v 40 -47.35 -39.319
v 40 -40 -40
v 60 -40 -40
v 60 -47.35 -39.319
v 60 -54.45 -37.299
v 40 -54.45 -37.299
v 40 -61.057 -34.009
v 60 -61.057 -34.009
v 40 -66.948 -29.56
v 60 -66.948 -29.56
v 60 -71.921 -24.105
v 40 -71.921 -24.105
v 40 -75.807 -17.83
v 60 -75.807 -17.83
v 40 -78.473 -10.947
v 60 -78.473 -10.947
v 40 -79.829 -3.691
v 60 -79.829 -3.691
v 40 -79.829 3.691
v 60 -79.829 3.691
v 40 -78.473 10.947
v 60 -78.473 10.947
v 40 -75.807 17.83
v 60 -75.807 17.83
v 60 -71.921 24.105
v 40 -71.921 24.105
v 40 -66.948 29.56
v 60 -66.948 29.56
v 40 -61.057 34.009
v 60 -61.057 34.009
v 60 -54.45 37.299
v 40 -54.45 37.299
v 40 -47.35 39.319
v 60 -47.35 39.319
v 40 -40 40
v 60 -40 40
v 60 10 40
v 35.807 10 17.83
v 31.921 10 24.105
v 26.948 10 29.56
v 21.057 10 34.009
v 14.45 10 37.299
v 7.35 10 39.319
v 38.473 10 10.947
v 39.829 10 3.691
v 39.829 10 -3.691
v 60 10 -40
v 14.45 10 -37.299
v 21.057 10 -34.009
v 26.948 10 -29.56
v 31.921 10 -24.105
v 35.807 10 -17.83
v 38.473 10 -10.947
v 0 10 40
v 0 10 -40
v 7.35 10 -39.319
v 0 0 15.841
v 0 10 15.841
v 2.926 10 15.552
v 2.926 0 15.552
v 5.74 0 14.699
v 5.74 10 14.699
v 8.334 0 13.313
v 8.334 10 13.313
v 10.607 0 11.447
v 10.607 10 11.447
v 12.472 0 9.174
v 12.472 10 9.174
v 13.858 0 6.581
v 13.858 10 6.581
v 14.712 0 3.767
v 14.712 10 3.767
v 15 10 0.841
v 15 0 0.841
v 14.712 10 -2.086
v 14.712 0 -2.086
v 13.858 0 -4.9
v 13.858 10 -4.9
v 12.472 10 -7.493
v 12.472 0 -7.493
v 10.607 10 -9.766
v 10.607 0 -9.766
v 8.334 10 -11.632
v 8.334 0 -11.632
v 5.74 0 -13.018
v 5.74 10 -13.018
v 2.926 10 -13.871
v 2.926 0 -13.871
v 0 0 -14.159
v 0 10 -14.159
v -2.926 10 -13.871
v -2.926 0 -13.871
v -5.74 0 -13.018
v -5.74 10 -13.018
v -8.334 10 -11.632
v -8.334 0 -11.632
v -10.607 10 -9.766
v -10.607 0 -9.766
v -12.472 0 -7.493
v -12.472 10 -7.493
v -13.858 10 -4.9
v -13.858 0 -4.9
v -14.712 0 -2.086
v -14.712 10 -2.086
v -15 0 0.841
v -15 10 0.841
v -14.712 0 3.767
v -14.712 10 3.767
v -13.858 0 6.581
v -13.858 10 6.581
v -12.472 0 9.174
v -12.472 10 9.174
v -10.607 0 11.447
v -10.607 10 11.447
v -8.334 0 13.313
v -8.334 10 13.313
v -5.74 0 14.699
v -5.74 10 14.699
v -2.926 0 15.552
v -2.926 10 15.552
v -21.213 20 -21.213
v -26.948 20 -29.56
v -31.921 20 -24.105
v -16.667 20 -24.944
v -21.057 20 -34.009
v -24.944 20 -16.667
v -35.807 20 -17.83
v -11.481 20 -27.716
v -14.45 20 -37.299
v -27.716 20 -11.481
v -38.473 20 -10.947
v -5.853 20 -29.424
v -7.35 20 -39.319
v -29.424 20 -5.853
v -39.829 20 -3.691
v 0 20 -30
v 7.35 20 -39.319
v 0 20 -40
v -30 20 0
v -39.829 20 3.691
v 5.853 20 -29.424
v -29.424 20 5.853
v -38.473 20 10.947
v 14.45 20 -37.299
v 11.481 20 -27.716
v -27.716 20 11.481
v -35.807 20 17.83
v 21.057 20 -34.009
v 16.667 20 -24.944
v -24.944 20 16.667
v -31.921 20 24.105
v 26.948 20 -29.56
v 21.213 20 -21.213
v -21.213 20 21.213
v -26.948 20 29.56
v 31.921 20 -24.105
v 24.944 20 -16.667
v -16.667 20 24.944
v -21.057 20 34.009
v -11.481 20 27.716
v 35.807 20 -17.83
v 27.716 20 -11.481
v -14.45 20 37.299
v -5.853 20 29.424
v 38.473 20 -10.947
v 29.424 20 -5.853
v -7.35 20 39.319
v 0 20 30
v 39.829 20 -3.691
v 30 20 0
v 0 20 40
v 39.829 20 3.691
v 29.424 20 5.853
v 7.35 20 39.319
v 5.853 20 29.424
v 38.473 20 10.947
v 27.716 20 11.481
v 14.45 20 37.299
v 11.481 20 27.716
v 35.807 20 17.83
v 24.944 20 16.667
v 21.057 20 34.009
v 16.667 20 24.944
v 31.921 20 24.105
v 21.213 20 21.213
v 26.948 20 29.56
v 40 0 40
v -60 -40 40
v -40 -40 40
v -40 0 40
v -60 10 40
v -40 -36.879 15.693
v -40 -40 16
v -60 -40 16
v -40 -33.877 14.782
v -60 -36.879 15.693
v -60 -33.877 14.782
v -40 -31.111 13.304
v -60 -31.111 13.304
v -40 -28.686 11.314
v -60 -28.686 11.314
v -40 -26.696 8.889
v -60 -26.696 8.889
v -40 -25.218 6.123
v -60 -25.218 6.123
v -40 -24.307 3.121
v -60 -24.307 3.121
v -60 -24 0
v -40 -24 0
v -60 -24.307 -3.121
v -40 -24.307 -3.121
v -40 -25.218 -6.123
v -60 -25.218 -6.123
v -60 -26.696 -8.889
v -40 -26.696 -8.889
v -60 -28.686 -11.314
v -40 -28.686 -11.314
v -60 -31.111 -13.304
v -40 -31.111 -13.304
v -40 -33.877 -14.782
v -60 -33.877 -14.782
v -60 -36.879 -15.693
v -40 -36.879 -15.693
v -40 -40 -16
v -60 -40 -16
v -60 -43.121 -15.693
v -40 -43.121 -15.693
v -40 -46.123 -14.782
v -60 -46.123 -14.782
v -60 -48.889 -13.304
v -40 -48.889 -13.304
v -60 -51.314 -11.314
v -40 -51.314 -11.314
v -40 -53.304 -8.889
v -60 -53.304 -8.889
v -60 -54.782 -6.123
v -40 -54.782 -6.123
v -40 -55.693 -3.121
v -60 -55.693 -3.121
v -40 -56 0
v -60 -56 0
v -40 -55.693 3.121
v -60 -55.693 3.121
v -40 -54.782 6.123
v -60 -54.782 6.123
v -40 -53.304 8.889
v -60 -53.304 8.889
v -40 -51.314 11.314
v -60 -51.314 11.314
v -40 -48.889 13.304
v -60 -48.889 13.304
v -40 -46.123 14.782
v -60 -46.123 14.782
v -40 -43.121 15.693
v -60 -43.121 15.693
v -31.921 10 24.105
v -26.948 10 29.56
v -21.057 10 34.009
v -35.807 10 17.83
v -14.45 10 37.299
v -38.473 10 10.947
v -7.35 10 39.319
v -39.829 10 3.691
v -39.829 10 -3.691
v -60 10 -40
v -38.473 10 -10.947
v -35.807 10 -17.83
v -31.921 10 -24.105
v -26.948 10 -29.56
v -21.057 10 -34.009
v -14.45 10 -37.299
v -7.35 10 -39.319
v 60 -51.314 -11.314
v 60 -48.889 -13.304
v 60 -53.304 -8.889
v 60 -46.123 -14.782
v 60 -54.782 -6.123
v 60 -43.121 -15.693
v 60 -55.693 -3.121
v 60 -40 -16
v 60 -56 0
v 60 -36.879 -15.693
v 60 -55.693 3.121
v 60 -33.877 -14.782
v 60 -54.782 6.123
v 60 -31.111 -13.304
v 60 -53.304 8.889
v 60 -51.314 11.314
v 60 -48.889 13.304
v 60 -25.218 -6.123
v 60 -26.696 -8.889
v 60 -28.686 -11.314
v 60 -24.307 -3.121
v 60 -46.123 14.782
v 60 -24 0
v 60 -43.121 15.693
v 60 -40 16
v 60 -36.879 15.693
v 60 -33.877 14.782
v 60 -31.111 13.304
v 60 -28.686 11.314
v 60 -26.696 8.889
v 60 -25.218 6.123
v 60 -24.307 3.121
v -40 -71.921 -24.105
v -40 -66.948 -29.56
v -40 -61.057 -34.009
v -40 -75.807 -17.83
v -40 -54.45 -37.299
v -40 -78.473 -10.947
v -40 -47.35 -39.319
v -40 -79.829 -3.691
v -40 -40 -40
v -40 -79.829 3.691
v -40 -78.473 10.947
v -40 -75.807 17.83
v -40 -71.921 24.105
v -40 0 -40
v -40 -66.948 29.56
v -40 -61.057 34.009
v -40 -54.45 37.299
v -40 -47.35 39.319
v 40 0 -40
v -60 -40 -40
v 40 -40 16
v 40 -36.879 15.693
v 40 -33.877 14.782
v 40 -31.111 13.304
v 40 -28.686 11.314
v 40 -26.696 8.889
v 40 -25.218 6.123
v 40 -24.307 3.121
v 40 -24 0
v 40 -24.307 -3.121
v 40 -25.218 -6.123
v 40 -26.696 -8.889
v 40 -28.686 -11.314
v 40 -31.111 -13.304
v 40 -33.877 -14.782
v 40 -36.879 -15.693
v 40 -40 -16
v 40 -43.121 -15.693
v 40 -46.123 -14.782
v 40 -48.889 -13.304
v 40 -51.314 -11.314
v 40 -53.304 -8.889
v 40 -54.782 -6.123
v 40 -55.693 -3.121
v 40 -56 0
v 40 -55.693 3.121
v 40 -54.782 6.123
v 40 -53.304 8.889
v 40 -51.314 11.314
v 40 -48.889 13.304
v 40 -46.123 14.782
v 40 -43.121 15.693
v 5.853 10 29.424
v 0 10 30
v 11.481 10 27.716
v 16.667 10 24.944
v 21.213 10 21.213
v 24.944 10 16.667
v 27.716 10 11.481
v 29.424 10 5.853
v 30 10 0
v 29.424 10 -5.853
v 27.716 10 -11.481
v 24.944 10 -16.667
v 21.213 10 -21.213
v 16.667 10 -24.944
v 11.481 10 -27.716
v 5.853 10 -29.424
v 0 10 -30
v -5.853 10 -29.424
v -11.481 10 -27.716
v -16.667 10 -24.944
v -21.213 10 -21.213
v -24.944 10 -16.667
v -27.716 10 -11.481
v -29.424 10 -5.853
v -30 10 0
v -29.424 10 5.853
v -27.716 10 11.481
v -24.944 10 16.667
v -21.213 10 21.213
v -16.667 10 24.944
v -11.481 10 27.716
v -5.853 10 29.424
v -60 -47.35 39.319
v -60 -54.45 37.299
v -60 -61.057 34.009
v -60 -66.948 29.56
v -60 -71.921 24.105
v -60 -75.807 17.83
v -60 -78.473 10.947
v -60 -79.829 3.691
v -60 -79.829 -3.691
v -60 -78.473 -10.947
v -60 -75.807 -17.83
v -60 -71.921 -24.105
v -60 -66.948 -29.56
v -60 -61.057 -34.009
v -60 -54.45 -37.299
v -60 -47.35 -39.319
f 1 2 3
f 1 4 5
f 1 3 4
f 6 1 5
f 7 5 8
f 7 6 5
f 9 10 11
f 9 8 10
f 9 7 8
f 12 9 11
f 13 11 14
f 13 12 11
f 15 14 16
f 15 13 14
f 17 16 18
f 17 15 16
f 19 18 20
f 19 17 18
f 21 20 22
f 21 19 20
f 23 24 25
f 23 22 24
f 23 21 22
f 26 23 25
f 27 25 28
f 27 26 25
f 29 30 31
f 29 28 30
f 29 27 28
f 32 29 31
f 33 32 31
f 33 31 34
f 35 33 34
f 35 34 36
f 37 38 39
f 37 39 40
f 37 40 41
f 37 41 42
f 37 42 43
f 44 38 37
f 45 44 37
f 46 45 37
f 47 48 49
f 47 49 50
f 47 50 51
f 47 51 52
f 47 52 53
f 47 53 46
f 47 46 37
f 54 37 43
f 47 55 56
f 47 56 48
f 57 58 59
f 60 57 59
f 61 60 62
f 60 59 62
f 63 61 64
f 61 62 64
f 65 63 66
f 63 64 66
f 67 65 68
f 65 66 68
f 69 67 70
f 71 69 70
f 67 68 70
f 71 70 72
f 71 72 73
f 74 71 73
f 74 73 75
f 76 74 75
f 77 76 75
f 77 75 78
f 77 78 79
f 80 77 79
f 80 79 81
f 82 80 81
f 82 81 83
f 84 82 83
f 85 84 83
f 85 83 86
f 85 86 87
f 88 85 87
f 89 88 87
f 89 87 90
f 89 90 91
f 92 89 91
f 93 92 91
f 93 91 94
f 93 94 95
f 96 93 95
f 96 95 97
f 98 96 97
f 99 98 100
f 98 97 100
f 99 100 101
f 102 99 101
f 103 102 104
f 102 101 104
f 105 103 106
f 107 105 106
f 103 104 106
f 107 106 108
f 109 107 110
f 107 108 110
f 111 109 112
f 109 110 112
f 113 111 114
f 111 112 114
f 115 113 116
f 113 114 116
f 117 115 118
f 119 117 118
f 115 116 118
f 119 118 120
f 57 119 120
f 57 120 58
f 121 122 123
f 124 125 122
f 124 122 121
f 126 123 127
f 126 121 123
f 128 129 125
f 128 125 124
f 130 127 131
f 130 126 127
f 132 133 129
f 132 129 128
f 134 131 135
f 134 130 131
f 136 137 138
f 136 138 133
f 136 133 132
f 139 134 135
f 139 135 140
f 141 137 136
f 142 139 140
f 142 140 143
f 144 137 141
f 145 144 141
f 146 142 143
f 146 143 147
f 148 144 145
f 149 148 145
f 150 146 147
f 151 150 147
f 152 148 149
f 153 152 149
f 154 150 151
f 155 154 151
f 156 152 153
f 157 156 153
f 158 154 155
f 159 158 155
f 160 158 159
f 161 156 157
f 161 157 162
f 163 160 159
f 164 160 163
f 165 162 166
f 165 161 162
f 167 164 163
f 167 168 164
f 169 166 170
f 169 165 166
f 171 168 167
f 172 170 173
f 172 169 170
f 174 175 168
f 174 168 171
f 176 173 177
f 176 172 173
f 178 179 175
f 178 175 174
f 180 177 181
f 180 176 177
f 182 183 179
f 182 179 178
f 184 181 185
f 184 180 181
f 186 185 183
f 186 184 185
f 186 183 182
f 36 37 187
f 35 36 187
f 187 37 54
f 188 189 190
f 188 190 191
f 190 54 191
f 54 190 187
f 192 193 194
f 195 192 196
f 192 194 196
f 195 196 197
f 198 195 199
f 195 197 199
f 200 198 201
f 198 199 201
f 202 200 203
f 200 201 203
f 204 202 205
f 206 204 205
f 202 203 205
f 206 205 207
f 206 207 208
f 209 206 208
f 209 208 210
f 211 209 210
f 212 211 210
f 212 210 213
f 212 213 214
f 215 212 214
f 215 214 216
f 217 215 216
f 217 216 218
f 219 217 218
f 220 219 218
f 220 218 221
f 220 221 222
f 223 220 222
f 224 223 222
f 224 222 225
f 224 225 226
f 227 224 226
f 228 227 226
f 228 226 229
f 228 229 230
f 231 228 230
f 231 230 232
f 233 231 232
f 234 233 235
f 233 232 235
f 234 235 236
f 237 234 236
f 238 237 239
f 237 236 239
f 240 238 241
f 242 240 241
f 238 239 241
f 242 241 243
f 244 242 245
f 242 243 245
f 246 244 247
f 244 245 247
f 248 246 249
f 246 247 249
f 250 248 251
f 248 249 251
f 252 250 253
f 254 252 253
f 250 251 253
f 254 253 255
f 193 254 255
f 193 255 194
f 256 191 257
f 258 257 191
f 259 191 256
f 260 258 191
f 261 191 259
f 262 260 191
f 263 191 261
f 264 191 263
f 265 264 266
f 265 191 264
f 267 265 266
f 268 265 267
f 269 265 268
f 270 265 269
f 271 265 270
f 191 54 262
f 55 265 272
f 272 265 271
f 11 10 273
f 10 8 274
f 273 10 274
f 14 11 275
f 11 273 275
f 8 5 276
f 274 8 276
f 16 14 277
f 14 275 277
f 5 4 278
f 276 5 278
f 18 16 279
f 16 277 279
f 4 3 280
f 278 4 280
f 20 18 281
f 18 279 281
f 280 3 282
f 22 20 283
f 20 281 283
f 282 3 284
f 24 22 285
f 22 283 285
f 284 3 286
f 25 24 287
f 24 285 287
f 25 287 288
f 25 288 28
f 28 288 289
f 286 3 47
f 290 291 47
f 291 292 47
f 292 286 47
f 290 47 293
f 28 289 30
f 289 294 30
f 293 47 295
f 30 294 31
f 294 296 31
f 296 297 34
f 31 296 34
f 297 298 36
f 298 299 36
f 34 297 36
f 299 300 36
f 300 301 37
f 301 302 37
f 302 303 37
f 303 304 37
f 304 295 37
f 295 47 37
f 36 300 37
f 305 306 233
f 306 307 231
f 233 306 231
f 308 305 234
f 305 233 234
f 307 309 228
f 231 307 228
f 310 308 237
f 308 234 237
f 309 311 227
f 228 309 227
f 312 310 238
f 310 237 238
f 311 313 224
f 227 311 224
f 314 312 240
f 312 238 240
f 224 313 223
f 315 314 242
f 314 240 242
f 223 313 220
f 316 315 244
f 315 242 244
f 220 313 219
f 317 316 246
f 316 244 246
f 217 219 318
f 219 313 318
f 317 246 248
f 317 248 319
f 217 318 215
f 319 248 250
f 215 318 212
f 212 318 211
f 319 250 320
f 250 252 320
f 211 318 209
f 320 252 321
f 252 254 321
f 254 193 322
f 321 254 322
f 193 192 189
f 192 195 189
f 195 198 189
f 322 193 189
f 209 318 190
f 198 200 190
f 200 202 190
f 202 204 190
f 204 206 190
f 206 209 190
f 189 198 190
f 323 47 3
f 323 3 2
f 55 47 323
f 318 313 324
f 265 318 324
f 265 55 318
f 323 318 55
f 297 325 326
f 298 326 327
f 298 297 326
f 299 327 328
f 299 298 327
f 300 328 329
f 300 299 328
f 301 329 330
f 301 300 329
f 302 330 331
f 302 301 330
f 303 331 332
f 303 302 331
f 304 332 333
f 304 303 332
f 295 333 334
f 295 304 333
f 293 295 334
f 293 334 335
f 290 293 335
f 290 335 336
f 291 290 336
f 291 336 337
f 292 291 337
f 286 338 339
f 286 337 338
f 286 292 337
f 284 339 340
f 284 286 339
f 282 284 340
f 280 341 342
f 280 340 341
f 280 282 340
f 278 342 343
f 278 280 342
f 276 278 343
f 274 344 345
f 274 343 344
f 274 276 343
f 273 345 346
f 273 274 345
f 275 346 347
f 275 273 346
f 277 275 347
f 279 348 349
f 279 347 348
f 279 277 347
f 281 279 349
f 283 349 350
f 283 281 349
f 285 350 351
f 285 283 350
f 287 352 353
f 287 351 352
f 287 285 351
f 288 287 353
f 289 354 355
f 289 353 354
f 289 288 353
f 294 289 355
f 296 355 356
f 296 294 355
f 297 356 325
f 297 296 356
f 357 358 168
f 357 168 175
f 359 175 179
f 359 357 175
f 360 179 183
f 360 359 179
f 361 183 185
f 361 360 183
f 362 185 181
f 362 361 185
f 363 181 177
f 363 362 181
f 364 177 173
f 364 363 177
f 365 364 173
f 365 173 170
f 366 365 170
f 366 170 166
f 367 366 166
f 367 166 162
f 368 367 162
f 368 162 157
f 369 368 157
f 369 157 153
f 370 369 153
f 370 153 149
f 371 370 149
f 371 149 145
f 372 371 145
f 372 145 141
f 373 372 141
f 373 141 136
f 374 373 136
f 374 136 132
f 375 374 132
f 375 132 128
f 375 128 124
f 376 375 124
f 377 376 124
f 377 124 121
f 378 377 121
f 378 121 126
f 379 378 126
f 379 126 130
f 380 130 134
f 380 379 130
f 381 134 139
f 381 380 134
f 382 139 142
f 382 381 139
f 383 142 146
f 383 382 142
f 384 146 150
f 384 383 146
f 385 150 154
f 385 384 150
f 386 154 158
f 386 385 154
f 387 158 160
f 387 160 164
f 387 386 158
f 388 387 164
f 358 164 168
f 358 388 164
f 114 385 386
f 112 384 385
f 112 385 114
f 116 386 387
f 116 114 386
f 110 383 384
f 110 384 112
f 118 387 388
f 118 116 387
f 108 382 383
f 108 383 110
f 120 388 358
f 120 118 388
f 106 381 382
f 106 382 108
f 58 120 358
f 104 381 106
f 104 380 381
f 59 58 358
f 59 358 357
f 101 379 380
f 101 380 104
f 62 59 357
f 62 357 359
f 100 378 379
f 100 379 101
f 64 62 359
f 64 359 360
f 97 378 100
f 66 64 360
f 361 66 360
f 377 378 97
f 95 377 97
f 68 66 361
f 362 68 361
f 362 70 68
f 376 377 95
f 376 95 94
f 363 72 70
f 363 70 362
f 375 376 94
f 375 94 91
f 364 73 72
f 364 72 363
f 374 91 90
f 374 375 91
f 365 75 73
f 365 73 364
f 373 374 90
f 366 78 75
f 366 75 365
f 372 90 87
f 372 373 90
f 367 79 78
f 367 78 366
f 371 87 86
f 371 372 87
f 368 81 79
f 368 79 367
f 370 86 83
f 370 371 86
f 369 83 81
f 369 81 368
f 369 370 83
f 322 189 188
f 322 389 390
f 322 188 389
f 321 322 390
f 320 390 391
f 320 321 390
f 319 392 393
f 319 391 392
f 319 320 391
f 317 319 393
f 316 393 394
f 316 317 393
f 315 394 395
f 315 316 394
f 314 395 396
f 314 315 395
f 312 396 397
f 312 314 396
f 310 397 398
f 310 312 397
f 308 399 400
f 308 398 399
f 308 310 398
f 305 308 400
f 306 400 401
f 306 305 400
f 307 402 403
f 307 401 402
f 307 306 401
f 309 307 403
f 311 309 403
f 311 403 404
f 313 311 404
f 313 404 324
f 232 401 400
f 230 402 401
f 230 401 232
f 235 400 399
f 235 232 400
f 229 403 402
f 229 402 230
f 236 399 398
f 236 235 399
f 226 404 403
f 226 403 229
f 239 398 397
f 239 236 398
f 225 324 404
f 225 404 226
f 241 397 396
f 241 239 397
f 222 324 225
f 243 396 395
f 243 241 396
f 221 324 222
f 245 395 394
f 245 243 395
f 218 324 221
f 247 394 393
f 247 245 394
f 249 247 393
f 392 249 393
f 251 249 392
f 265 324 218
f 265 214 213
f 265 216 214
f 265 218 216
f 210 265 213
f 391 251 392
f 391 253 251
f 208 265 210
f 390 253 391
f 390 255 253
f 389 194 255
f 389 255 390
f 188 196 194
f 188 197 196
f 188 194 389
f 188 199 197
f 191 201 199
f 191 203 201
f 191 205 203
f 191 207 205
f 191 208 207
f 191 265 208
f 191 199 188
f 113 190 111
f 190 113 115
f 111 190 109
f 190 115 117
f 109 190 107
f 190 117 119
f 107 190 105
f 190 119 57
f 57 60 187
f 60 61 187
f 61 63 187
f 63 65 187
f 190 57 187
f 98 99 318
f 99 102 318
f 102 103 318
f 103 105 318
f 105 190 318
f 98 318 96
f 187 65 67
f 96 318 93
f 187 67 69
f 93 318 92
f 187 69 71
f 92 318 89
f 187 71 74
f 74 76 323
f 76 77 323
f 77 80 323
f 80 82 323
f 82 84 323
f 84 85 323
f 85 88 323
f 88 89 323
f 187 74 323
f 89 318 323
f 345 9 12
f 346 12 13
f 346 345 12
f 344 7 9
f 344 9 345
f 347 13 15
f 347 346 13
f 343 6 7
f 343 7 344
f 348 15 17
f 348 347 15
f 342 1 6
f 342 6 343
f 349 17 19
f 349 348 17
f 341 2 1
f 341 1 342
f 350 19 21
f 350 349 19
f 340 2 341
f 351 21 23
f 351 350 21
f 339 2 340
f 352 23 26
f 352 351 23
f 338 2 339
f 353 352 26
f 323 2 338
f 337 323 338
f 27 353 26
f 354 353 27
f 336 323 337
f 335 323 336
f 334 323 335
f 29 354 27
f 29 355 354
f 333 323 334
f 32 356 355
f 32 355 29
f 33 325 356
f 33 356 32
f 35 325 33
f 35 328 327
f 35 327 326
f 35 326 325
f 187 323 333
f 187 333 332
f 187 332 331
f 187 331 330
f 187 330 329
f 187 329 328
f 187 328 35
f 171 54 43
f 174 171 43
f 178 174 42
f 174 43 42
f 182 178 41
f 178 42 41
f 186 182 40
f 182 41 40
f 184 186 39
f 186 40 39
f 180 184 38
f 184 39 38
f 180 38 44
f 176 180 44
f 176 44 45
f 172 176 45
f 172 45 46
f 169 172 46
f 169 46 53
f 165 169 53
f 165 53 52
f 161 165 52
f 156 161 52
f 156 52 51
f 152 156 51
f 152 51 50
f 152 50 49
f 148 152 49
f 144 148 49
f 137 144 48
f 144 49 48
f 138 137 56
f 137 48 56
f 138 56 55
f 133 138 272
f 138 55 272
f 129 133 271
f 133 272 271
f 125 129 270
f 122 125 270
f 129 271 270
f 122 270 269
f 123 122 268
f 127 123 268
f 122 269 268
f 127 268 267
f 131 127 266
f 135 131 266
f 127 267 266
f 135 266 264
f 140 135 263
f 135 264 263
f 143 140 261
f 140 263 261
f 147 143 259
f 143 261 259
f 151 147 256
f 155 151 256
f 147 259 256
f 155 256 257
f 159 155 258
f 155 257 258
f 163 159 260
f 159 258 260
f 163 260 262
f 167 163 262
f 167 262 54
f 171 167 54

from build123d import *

# Parameters (mm, degrees)
SKETCH1_W                   = 120
SKETCH1_H                   = 80
BOSS_EXTRUDE1_DEPTH         = 10
SKETCH2_R                   = 40
SKETCH2_R_2                 = 30
BOSS_EXTRUDE2_DEPTH         = 20
SKETCH3_R                   = 15
CUT_EXTRUDE1_DEPTH          = 20
SKETCH4_W                   = 20
SKETCH4_H                   = 80
BOSS_EXTRUDE3_DEPTH         = 80
FILLET1_RADIUS              = 40
FILLET1_LENGTH              = 20
SKETCH5_R                   = 16
CUT_EXTRUDE3_DEPTH          = 150.666295471
FILLET1_OF_MIRROR5_2_RADIUS = 40
FILLET1_OF_MIRROR5_2_LENGTH = 20


with BuildPart() as part:
    # Sketch1 → Boss-Extrude1 (new body)
    with BuildSketch(Plane(origin=(0, 0, 0), x_dir=(1, 0, 0), z_dir=(0, 1, 0))):
        Rectangle(SKETCH1_W, SKETCH1_H)
    extrude(amount=BOSS_EXTRUDE1_DEPTH)

    # Sketch2 → Boss-Extrude2 (add)
    with BuildSketch(Plane(origin=(0, 0, 0), x_dir=(1, 0, 0), z_dir=(0, 1, 0))):
        with Locations(Location((0, 0, 0), (0, 0, 270))):
            Circle(SKETCH2_R)
        with Locations(Location((0, 0, 0), (0, 0, 270))):
            Circle(SKETCH2_R_2, mode=Mode.SUBTRACT)
    extrude(amount=BOSS_EXTRUDE2_DEPTH)

    # Sketch3 → Cut-Extrude1 (cut)
    with BuildSketch(Plane(origin=(0, 10, 0), x_dir=(1, 0, 0), z_dir=(0, 1, 0))):
        with Locations(Location((0, -0.840544131, 0), (0, 0, 270))):
            Circle(SKETCH3_R)
    extrude(amount=-CUT_EXTRUDE1_DEPTH, mode=Mode.SUBTRACT)

    # Sketch4 → Boss-Extrude3 (add)
    with BuildSketch(Plane.XZ):
        with Locations((-50, 0)):
            Rectangle(SKETCH4_W, SKETCH4_H)
    boss_extrude3 = extrude(amount=BOSS_EXTRUDE3_DEPTH)

    # Fillet1: full round fillet: the end face becomes a half cylinder, R = half its width
    fillet1_face = Plane((-50, -80, 0), x_dir=(1, 0, 0), z_dir=(0, -1, 0))  # on the end face: x along it, z out of the body
    fillet1_slab = fillet1_face.offset(-FILLET1_RADIUS / 2) * Box(FILLET1_LENGTH, 2 * FILLET1_RADIUS, FILLET1_RADIUS, mode=Mode.PRIVATE)  # the body's end, R deep
    fillet1_round = Plane((-50, -40, 0), x_dir=(0, -1, 0), z_dir=(1, 0, 0)) * Cylinder(FILLET1_RADIUS, FILLET1_LENGTH, mode=Mode.PRIVATE)  # its axis R under the face
    add(fillet1_slab - fillet1_round, mode=Mode.SUBTRACT)

    # Sketch5 → Cut-Extrude3 (cut, through all)
    with BuildSketch(Plane.ZY.offset(60)):
        with Locations((0, -40)):
            Circle(SKETCH5_R)
    cut_extrude3 = extrude(amount=-CUT_EXTRUDE3_DEPTH, mode=Mode.SUBTRACT)

    # Mirror5: Boss-Extrude3 across plane
    add(boss_extrude3.mirror(Plane(origin=(0, 0, 0), x_dir=(0, 0, 1), z_dir=(1, 0, 0))))

    # Fillet1 of Mirror5 2: full round fillet: the end face becomes a half cylinder, R = half its width
    fillet1_of_mirror5_2_face = Plane((50, -80, 0), x_dir=(-1, 0, 0), z_dir=(0, -1, 0))  # on the end face: x along it, z out of the body
    fillet1_of_mirror5_2_slab = fillet1_of_mirror5_2_face.offset(-FILLET1_OF_MIRROR5_2_RADIUS / 2) * Box(FILLET1_OF_MIRROR5_2_LENGTH, 2 * FILLET1_OF_MIRROR5_2_RADIUS, FILLET1_OF_MIRROR5_2_RADIUS, mode=Mode.PRIVATE)  # the body's end, R deep
    fillet1_of_mirror5_2_round = Plane((50, -40, 0), x_dir=(0, -1, 0), z_dir=(-1, 0, 0)) * Cylinder(FILLET1_OF_MIRROR5_2_RADIUS, FILLET1_OF_MIRROR5_2_LENGTH, mode=Mode.PRIVATE)  # its axis R under the face
    add(fillet1_of_mirror5_2_slab - fillet1_of_mirror5_2_round, mode=Mode.SUBTRACT)

    # Mirror6: Cut-Extrude3 across plane
    add(cut_extrude3.mirror(Plane(origin=(0, 0, 0), x_dir=(0, 0, 1), z_dir=(1, 0, 0))), mode=Mode.SUBTRACT)


solid = part.part
